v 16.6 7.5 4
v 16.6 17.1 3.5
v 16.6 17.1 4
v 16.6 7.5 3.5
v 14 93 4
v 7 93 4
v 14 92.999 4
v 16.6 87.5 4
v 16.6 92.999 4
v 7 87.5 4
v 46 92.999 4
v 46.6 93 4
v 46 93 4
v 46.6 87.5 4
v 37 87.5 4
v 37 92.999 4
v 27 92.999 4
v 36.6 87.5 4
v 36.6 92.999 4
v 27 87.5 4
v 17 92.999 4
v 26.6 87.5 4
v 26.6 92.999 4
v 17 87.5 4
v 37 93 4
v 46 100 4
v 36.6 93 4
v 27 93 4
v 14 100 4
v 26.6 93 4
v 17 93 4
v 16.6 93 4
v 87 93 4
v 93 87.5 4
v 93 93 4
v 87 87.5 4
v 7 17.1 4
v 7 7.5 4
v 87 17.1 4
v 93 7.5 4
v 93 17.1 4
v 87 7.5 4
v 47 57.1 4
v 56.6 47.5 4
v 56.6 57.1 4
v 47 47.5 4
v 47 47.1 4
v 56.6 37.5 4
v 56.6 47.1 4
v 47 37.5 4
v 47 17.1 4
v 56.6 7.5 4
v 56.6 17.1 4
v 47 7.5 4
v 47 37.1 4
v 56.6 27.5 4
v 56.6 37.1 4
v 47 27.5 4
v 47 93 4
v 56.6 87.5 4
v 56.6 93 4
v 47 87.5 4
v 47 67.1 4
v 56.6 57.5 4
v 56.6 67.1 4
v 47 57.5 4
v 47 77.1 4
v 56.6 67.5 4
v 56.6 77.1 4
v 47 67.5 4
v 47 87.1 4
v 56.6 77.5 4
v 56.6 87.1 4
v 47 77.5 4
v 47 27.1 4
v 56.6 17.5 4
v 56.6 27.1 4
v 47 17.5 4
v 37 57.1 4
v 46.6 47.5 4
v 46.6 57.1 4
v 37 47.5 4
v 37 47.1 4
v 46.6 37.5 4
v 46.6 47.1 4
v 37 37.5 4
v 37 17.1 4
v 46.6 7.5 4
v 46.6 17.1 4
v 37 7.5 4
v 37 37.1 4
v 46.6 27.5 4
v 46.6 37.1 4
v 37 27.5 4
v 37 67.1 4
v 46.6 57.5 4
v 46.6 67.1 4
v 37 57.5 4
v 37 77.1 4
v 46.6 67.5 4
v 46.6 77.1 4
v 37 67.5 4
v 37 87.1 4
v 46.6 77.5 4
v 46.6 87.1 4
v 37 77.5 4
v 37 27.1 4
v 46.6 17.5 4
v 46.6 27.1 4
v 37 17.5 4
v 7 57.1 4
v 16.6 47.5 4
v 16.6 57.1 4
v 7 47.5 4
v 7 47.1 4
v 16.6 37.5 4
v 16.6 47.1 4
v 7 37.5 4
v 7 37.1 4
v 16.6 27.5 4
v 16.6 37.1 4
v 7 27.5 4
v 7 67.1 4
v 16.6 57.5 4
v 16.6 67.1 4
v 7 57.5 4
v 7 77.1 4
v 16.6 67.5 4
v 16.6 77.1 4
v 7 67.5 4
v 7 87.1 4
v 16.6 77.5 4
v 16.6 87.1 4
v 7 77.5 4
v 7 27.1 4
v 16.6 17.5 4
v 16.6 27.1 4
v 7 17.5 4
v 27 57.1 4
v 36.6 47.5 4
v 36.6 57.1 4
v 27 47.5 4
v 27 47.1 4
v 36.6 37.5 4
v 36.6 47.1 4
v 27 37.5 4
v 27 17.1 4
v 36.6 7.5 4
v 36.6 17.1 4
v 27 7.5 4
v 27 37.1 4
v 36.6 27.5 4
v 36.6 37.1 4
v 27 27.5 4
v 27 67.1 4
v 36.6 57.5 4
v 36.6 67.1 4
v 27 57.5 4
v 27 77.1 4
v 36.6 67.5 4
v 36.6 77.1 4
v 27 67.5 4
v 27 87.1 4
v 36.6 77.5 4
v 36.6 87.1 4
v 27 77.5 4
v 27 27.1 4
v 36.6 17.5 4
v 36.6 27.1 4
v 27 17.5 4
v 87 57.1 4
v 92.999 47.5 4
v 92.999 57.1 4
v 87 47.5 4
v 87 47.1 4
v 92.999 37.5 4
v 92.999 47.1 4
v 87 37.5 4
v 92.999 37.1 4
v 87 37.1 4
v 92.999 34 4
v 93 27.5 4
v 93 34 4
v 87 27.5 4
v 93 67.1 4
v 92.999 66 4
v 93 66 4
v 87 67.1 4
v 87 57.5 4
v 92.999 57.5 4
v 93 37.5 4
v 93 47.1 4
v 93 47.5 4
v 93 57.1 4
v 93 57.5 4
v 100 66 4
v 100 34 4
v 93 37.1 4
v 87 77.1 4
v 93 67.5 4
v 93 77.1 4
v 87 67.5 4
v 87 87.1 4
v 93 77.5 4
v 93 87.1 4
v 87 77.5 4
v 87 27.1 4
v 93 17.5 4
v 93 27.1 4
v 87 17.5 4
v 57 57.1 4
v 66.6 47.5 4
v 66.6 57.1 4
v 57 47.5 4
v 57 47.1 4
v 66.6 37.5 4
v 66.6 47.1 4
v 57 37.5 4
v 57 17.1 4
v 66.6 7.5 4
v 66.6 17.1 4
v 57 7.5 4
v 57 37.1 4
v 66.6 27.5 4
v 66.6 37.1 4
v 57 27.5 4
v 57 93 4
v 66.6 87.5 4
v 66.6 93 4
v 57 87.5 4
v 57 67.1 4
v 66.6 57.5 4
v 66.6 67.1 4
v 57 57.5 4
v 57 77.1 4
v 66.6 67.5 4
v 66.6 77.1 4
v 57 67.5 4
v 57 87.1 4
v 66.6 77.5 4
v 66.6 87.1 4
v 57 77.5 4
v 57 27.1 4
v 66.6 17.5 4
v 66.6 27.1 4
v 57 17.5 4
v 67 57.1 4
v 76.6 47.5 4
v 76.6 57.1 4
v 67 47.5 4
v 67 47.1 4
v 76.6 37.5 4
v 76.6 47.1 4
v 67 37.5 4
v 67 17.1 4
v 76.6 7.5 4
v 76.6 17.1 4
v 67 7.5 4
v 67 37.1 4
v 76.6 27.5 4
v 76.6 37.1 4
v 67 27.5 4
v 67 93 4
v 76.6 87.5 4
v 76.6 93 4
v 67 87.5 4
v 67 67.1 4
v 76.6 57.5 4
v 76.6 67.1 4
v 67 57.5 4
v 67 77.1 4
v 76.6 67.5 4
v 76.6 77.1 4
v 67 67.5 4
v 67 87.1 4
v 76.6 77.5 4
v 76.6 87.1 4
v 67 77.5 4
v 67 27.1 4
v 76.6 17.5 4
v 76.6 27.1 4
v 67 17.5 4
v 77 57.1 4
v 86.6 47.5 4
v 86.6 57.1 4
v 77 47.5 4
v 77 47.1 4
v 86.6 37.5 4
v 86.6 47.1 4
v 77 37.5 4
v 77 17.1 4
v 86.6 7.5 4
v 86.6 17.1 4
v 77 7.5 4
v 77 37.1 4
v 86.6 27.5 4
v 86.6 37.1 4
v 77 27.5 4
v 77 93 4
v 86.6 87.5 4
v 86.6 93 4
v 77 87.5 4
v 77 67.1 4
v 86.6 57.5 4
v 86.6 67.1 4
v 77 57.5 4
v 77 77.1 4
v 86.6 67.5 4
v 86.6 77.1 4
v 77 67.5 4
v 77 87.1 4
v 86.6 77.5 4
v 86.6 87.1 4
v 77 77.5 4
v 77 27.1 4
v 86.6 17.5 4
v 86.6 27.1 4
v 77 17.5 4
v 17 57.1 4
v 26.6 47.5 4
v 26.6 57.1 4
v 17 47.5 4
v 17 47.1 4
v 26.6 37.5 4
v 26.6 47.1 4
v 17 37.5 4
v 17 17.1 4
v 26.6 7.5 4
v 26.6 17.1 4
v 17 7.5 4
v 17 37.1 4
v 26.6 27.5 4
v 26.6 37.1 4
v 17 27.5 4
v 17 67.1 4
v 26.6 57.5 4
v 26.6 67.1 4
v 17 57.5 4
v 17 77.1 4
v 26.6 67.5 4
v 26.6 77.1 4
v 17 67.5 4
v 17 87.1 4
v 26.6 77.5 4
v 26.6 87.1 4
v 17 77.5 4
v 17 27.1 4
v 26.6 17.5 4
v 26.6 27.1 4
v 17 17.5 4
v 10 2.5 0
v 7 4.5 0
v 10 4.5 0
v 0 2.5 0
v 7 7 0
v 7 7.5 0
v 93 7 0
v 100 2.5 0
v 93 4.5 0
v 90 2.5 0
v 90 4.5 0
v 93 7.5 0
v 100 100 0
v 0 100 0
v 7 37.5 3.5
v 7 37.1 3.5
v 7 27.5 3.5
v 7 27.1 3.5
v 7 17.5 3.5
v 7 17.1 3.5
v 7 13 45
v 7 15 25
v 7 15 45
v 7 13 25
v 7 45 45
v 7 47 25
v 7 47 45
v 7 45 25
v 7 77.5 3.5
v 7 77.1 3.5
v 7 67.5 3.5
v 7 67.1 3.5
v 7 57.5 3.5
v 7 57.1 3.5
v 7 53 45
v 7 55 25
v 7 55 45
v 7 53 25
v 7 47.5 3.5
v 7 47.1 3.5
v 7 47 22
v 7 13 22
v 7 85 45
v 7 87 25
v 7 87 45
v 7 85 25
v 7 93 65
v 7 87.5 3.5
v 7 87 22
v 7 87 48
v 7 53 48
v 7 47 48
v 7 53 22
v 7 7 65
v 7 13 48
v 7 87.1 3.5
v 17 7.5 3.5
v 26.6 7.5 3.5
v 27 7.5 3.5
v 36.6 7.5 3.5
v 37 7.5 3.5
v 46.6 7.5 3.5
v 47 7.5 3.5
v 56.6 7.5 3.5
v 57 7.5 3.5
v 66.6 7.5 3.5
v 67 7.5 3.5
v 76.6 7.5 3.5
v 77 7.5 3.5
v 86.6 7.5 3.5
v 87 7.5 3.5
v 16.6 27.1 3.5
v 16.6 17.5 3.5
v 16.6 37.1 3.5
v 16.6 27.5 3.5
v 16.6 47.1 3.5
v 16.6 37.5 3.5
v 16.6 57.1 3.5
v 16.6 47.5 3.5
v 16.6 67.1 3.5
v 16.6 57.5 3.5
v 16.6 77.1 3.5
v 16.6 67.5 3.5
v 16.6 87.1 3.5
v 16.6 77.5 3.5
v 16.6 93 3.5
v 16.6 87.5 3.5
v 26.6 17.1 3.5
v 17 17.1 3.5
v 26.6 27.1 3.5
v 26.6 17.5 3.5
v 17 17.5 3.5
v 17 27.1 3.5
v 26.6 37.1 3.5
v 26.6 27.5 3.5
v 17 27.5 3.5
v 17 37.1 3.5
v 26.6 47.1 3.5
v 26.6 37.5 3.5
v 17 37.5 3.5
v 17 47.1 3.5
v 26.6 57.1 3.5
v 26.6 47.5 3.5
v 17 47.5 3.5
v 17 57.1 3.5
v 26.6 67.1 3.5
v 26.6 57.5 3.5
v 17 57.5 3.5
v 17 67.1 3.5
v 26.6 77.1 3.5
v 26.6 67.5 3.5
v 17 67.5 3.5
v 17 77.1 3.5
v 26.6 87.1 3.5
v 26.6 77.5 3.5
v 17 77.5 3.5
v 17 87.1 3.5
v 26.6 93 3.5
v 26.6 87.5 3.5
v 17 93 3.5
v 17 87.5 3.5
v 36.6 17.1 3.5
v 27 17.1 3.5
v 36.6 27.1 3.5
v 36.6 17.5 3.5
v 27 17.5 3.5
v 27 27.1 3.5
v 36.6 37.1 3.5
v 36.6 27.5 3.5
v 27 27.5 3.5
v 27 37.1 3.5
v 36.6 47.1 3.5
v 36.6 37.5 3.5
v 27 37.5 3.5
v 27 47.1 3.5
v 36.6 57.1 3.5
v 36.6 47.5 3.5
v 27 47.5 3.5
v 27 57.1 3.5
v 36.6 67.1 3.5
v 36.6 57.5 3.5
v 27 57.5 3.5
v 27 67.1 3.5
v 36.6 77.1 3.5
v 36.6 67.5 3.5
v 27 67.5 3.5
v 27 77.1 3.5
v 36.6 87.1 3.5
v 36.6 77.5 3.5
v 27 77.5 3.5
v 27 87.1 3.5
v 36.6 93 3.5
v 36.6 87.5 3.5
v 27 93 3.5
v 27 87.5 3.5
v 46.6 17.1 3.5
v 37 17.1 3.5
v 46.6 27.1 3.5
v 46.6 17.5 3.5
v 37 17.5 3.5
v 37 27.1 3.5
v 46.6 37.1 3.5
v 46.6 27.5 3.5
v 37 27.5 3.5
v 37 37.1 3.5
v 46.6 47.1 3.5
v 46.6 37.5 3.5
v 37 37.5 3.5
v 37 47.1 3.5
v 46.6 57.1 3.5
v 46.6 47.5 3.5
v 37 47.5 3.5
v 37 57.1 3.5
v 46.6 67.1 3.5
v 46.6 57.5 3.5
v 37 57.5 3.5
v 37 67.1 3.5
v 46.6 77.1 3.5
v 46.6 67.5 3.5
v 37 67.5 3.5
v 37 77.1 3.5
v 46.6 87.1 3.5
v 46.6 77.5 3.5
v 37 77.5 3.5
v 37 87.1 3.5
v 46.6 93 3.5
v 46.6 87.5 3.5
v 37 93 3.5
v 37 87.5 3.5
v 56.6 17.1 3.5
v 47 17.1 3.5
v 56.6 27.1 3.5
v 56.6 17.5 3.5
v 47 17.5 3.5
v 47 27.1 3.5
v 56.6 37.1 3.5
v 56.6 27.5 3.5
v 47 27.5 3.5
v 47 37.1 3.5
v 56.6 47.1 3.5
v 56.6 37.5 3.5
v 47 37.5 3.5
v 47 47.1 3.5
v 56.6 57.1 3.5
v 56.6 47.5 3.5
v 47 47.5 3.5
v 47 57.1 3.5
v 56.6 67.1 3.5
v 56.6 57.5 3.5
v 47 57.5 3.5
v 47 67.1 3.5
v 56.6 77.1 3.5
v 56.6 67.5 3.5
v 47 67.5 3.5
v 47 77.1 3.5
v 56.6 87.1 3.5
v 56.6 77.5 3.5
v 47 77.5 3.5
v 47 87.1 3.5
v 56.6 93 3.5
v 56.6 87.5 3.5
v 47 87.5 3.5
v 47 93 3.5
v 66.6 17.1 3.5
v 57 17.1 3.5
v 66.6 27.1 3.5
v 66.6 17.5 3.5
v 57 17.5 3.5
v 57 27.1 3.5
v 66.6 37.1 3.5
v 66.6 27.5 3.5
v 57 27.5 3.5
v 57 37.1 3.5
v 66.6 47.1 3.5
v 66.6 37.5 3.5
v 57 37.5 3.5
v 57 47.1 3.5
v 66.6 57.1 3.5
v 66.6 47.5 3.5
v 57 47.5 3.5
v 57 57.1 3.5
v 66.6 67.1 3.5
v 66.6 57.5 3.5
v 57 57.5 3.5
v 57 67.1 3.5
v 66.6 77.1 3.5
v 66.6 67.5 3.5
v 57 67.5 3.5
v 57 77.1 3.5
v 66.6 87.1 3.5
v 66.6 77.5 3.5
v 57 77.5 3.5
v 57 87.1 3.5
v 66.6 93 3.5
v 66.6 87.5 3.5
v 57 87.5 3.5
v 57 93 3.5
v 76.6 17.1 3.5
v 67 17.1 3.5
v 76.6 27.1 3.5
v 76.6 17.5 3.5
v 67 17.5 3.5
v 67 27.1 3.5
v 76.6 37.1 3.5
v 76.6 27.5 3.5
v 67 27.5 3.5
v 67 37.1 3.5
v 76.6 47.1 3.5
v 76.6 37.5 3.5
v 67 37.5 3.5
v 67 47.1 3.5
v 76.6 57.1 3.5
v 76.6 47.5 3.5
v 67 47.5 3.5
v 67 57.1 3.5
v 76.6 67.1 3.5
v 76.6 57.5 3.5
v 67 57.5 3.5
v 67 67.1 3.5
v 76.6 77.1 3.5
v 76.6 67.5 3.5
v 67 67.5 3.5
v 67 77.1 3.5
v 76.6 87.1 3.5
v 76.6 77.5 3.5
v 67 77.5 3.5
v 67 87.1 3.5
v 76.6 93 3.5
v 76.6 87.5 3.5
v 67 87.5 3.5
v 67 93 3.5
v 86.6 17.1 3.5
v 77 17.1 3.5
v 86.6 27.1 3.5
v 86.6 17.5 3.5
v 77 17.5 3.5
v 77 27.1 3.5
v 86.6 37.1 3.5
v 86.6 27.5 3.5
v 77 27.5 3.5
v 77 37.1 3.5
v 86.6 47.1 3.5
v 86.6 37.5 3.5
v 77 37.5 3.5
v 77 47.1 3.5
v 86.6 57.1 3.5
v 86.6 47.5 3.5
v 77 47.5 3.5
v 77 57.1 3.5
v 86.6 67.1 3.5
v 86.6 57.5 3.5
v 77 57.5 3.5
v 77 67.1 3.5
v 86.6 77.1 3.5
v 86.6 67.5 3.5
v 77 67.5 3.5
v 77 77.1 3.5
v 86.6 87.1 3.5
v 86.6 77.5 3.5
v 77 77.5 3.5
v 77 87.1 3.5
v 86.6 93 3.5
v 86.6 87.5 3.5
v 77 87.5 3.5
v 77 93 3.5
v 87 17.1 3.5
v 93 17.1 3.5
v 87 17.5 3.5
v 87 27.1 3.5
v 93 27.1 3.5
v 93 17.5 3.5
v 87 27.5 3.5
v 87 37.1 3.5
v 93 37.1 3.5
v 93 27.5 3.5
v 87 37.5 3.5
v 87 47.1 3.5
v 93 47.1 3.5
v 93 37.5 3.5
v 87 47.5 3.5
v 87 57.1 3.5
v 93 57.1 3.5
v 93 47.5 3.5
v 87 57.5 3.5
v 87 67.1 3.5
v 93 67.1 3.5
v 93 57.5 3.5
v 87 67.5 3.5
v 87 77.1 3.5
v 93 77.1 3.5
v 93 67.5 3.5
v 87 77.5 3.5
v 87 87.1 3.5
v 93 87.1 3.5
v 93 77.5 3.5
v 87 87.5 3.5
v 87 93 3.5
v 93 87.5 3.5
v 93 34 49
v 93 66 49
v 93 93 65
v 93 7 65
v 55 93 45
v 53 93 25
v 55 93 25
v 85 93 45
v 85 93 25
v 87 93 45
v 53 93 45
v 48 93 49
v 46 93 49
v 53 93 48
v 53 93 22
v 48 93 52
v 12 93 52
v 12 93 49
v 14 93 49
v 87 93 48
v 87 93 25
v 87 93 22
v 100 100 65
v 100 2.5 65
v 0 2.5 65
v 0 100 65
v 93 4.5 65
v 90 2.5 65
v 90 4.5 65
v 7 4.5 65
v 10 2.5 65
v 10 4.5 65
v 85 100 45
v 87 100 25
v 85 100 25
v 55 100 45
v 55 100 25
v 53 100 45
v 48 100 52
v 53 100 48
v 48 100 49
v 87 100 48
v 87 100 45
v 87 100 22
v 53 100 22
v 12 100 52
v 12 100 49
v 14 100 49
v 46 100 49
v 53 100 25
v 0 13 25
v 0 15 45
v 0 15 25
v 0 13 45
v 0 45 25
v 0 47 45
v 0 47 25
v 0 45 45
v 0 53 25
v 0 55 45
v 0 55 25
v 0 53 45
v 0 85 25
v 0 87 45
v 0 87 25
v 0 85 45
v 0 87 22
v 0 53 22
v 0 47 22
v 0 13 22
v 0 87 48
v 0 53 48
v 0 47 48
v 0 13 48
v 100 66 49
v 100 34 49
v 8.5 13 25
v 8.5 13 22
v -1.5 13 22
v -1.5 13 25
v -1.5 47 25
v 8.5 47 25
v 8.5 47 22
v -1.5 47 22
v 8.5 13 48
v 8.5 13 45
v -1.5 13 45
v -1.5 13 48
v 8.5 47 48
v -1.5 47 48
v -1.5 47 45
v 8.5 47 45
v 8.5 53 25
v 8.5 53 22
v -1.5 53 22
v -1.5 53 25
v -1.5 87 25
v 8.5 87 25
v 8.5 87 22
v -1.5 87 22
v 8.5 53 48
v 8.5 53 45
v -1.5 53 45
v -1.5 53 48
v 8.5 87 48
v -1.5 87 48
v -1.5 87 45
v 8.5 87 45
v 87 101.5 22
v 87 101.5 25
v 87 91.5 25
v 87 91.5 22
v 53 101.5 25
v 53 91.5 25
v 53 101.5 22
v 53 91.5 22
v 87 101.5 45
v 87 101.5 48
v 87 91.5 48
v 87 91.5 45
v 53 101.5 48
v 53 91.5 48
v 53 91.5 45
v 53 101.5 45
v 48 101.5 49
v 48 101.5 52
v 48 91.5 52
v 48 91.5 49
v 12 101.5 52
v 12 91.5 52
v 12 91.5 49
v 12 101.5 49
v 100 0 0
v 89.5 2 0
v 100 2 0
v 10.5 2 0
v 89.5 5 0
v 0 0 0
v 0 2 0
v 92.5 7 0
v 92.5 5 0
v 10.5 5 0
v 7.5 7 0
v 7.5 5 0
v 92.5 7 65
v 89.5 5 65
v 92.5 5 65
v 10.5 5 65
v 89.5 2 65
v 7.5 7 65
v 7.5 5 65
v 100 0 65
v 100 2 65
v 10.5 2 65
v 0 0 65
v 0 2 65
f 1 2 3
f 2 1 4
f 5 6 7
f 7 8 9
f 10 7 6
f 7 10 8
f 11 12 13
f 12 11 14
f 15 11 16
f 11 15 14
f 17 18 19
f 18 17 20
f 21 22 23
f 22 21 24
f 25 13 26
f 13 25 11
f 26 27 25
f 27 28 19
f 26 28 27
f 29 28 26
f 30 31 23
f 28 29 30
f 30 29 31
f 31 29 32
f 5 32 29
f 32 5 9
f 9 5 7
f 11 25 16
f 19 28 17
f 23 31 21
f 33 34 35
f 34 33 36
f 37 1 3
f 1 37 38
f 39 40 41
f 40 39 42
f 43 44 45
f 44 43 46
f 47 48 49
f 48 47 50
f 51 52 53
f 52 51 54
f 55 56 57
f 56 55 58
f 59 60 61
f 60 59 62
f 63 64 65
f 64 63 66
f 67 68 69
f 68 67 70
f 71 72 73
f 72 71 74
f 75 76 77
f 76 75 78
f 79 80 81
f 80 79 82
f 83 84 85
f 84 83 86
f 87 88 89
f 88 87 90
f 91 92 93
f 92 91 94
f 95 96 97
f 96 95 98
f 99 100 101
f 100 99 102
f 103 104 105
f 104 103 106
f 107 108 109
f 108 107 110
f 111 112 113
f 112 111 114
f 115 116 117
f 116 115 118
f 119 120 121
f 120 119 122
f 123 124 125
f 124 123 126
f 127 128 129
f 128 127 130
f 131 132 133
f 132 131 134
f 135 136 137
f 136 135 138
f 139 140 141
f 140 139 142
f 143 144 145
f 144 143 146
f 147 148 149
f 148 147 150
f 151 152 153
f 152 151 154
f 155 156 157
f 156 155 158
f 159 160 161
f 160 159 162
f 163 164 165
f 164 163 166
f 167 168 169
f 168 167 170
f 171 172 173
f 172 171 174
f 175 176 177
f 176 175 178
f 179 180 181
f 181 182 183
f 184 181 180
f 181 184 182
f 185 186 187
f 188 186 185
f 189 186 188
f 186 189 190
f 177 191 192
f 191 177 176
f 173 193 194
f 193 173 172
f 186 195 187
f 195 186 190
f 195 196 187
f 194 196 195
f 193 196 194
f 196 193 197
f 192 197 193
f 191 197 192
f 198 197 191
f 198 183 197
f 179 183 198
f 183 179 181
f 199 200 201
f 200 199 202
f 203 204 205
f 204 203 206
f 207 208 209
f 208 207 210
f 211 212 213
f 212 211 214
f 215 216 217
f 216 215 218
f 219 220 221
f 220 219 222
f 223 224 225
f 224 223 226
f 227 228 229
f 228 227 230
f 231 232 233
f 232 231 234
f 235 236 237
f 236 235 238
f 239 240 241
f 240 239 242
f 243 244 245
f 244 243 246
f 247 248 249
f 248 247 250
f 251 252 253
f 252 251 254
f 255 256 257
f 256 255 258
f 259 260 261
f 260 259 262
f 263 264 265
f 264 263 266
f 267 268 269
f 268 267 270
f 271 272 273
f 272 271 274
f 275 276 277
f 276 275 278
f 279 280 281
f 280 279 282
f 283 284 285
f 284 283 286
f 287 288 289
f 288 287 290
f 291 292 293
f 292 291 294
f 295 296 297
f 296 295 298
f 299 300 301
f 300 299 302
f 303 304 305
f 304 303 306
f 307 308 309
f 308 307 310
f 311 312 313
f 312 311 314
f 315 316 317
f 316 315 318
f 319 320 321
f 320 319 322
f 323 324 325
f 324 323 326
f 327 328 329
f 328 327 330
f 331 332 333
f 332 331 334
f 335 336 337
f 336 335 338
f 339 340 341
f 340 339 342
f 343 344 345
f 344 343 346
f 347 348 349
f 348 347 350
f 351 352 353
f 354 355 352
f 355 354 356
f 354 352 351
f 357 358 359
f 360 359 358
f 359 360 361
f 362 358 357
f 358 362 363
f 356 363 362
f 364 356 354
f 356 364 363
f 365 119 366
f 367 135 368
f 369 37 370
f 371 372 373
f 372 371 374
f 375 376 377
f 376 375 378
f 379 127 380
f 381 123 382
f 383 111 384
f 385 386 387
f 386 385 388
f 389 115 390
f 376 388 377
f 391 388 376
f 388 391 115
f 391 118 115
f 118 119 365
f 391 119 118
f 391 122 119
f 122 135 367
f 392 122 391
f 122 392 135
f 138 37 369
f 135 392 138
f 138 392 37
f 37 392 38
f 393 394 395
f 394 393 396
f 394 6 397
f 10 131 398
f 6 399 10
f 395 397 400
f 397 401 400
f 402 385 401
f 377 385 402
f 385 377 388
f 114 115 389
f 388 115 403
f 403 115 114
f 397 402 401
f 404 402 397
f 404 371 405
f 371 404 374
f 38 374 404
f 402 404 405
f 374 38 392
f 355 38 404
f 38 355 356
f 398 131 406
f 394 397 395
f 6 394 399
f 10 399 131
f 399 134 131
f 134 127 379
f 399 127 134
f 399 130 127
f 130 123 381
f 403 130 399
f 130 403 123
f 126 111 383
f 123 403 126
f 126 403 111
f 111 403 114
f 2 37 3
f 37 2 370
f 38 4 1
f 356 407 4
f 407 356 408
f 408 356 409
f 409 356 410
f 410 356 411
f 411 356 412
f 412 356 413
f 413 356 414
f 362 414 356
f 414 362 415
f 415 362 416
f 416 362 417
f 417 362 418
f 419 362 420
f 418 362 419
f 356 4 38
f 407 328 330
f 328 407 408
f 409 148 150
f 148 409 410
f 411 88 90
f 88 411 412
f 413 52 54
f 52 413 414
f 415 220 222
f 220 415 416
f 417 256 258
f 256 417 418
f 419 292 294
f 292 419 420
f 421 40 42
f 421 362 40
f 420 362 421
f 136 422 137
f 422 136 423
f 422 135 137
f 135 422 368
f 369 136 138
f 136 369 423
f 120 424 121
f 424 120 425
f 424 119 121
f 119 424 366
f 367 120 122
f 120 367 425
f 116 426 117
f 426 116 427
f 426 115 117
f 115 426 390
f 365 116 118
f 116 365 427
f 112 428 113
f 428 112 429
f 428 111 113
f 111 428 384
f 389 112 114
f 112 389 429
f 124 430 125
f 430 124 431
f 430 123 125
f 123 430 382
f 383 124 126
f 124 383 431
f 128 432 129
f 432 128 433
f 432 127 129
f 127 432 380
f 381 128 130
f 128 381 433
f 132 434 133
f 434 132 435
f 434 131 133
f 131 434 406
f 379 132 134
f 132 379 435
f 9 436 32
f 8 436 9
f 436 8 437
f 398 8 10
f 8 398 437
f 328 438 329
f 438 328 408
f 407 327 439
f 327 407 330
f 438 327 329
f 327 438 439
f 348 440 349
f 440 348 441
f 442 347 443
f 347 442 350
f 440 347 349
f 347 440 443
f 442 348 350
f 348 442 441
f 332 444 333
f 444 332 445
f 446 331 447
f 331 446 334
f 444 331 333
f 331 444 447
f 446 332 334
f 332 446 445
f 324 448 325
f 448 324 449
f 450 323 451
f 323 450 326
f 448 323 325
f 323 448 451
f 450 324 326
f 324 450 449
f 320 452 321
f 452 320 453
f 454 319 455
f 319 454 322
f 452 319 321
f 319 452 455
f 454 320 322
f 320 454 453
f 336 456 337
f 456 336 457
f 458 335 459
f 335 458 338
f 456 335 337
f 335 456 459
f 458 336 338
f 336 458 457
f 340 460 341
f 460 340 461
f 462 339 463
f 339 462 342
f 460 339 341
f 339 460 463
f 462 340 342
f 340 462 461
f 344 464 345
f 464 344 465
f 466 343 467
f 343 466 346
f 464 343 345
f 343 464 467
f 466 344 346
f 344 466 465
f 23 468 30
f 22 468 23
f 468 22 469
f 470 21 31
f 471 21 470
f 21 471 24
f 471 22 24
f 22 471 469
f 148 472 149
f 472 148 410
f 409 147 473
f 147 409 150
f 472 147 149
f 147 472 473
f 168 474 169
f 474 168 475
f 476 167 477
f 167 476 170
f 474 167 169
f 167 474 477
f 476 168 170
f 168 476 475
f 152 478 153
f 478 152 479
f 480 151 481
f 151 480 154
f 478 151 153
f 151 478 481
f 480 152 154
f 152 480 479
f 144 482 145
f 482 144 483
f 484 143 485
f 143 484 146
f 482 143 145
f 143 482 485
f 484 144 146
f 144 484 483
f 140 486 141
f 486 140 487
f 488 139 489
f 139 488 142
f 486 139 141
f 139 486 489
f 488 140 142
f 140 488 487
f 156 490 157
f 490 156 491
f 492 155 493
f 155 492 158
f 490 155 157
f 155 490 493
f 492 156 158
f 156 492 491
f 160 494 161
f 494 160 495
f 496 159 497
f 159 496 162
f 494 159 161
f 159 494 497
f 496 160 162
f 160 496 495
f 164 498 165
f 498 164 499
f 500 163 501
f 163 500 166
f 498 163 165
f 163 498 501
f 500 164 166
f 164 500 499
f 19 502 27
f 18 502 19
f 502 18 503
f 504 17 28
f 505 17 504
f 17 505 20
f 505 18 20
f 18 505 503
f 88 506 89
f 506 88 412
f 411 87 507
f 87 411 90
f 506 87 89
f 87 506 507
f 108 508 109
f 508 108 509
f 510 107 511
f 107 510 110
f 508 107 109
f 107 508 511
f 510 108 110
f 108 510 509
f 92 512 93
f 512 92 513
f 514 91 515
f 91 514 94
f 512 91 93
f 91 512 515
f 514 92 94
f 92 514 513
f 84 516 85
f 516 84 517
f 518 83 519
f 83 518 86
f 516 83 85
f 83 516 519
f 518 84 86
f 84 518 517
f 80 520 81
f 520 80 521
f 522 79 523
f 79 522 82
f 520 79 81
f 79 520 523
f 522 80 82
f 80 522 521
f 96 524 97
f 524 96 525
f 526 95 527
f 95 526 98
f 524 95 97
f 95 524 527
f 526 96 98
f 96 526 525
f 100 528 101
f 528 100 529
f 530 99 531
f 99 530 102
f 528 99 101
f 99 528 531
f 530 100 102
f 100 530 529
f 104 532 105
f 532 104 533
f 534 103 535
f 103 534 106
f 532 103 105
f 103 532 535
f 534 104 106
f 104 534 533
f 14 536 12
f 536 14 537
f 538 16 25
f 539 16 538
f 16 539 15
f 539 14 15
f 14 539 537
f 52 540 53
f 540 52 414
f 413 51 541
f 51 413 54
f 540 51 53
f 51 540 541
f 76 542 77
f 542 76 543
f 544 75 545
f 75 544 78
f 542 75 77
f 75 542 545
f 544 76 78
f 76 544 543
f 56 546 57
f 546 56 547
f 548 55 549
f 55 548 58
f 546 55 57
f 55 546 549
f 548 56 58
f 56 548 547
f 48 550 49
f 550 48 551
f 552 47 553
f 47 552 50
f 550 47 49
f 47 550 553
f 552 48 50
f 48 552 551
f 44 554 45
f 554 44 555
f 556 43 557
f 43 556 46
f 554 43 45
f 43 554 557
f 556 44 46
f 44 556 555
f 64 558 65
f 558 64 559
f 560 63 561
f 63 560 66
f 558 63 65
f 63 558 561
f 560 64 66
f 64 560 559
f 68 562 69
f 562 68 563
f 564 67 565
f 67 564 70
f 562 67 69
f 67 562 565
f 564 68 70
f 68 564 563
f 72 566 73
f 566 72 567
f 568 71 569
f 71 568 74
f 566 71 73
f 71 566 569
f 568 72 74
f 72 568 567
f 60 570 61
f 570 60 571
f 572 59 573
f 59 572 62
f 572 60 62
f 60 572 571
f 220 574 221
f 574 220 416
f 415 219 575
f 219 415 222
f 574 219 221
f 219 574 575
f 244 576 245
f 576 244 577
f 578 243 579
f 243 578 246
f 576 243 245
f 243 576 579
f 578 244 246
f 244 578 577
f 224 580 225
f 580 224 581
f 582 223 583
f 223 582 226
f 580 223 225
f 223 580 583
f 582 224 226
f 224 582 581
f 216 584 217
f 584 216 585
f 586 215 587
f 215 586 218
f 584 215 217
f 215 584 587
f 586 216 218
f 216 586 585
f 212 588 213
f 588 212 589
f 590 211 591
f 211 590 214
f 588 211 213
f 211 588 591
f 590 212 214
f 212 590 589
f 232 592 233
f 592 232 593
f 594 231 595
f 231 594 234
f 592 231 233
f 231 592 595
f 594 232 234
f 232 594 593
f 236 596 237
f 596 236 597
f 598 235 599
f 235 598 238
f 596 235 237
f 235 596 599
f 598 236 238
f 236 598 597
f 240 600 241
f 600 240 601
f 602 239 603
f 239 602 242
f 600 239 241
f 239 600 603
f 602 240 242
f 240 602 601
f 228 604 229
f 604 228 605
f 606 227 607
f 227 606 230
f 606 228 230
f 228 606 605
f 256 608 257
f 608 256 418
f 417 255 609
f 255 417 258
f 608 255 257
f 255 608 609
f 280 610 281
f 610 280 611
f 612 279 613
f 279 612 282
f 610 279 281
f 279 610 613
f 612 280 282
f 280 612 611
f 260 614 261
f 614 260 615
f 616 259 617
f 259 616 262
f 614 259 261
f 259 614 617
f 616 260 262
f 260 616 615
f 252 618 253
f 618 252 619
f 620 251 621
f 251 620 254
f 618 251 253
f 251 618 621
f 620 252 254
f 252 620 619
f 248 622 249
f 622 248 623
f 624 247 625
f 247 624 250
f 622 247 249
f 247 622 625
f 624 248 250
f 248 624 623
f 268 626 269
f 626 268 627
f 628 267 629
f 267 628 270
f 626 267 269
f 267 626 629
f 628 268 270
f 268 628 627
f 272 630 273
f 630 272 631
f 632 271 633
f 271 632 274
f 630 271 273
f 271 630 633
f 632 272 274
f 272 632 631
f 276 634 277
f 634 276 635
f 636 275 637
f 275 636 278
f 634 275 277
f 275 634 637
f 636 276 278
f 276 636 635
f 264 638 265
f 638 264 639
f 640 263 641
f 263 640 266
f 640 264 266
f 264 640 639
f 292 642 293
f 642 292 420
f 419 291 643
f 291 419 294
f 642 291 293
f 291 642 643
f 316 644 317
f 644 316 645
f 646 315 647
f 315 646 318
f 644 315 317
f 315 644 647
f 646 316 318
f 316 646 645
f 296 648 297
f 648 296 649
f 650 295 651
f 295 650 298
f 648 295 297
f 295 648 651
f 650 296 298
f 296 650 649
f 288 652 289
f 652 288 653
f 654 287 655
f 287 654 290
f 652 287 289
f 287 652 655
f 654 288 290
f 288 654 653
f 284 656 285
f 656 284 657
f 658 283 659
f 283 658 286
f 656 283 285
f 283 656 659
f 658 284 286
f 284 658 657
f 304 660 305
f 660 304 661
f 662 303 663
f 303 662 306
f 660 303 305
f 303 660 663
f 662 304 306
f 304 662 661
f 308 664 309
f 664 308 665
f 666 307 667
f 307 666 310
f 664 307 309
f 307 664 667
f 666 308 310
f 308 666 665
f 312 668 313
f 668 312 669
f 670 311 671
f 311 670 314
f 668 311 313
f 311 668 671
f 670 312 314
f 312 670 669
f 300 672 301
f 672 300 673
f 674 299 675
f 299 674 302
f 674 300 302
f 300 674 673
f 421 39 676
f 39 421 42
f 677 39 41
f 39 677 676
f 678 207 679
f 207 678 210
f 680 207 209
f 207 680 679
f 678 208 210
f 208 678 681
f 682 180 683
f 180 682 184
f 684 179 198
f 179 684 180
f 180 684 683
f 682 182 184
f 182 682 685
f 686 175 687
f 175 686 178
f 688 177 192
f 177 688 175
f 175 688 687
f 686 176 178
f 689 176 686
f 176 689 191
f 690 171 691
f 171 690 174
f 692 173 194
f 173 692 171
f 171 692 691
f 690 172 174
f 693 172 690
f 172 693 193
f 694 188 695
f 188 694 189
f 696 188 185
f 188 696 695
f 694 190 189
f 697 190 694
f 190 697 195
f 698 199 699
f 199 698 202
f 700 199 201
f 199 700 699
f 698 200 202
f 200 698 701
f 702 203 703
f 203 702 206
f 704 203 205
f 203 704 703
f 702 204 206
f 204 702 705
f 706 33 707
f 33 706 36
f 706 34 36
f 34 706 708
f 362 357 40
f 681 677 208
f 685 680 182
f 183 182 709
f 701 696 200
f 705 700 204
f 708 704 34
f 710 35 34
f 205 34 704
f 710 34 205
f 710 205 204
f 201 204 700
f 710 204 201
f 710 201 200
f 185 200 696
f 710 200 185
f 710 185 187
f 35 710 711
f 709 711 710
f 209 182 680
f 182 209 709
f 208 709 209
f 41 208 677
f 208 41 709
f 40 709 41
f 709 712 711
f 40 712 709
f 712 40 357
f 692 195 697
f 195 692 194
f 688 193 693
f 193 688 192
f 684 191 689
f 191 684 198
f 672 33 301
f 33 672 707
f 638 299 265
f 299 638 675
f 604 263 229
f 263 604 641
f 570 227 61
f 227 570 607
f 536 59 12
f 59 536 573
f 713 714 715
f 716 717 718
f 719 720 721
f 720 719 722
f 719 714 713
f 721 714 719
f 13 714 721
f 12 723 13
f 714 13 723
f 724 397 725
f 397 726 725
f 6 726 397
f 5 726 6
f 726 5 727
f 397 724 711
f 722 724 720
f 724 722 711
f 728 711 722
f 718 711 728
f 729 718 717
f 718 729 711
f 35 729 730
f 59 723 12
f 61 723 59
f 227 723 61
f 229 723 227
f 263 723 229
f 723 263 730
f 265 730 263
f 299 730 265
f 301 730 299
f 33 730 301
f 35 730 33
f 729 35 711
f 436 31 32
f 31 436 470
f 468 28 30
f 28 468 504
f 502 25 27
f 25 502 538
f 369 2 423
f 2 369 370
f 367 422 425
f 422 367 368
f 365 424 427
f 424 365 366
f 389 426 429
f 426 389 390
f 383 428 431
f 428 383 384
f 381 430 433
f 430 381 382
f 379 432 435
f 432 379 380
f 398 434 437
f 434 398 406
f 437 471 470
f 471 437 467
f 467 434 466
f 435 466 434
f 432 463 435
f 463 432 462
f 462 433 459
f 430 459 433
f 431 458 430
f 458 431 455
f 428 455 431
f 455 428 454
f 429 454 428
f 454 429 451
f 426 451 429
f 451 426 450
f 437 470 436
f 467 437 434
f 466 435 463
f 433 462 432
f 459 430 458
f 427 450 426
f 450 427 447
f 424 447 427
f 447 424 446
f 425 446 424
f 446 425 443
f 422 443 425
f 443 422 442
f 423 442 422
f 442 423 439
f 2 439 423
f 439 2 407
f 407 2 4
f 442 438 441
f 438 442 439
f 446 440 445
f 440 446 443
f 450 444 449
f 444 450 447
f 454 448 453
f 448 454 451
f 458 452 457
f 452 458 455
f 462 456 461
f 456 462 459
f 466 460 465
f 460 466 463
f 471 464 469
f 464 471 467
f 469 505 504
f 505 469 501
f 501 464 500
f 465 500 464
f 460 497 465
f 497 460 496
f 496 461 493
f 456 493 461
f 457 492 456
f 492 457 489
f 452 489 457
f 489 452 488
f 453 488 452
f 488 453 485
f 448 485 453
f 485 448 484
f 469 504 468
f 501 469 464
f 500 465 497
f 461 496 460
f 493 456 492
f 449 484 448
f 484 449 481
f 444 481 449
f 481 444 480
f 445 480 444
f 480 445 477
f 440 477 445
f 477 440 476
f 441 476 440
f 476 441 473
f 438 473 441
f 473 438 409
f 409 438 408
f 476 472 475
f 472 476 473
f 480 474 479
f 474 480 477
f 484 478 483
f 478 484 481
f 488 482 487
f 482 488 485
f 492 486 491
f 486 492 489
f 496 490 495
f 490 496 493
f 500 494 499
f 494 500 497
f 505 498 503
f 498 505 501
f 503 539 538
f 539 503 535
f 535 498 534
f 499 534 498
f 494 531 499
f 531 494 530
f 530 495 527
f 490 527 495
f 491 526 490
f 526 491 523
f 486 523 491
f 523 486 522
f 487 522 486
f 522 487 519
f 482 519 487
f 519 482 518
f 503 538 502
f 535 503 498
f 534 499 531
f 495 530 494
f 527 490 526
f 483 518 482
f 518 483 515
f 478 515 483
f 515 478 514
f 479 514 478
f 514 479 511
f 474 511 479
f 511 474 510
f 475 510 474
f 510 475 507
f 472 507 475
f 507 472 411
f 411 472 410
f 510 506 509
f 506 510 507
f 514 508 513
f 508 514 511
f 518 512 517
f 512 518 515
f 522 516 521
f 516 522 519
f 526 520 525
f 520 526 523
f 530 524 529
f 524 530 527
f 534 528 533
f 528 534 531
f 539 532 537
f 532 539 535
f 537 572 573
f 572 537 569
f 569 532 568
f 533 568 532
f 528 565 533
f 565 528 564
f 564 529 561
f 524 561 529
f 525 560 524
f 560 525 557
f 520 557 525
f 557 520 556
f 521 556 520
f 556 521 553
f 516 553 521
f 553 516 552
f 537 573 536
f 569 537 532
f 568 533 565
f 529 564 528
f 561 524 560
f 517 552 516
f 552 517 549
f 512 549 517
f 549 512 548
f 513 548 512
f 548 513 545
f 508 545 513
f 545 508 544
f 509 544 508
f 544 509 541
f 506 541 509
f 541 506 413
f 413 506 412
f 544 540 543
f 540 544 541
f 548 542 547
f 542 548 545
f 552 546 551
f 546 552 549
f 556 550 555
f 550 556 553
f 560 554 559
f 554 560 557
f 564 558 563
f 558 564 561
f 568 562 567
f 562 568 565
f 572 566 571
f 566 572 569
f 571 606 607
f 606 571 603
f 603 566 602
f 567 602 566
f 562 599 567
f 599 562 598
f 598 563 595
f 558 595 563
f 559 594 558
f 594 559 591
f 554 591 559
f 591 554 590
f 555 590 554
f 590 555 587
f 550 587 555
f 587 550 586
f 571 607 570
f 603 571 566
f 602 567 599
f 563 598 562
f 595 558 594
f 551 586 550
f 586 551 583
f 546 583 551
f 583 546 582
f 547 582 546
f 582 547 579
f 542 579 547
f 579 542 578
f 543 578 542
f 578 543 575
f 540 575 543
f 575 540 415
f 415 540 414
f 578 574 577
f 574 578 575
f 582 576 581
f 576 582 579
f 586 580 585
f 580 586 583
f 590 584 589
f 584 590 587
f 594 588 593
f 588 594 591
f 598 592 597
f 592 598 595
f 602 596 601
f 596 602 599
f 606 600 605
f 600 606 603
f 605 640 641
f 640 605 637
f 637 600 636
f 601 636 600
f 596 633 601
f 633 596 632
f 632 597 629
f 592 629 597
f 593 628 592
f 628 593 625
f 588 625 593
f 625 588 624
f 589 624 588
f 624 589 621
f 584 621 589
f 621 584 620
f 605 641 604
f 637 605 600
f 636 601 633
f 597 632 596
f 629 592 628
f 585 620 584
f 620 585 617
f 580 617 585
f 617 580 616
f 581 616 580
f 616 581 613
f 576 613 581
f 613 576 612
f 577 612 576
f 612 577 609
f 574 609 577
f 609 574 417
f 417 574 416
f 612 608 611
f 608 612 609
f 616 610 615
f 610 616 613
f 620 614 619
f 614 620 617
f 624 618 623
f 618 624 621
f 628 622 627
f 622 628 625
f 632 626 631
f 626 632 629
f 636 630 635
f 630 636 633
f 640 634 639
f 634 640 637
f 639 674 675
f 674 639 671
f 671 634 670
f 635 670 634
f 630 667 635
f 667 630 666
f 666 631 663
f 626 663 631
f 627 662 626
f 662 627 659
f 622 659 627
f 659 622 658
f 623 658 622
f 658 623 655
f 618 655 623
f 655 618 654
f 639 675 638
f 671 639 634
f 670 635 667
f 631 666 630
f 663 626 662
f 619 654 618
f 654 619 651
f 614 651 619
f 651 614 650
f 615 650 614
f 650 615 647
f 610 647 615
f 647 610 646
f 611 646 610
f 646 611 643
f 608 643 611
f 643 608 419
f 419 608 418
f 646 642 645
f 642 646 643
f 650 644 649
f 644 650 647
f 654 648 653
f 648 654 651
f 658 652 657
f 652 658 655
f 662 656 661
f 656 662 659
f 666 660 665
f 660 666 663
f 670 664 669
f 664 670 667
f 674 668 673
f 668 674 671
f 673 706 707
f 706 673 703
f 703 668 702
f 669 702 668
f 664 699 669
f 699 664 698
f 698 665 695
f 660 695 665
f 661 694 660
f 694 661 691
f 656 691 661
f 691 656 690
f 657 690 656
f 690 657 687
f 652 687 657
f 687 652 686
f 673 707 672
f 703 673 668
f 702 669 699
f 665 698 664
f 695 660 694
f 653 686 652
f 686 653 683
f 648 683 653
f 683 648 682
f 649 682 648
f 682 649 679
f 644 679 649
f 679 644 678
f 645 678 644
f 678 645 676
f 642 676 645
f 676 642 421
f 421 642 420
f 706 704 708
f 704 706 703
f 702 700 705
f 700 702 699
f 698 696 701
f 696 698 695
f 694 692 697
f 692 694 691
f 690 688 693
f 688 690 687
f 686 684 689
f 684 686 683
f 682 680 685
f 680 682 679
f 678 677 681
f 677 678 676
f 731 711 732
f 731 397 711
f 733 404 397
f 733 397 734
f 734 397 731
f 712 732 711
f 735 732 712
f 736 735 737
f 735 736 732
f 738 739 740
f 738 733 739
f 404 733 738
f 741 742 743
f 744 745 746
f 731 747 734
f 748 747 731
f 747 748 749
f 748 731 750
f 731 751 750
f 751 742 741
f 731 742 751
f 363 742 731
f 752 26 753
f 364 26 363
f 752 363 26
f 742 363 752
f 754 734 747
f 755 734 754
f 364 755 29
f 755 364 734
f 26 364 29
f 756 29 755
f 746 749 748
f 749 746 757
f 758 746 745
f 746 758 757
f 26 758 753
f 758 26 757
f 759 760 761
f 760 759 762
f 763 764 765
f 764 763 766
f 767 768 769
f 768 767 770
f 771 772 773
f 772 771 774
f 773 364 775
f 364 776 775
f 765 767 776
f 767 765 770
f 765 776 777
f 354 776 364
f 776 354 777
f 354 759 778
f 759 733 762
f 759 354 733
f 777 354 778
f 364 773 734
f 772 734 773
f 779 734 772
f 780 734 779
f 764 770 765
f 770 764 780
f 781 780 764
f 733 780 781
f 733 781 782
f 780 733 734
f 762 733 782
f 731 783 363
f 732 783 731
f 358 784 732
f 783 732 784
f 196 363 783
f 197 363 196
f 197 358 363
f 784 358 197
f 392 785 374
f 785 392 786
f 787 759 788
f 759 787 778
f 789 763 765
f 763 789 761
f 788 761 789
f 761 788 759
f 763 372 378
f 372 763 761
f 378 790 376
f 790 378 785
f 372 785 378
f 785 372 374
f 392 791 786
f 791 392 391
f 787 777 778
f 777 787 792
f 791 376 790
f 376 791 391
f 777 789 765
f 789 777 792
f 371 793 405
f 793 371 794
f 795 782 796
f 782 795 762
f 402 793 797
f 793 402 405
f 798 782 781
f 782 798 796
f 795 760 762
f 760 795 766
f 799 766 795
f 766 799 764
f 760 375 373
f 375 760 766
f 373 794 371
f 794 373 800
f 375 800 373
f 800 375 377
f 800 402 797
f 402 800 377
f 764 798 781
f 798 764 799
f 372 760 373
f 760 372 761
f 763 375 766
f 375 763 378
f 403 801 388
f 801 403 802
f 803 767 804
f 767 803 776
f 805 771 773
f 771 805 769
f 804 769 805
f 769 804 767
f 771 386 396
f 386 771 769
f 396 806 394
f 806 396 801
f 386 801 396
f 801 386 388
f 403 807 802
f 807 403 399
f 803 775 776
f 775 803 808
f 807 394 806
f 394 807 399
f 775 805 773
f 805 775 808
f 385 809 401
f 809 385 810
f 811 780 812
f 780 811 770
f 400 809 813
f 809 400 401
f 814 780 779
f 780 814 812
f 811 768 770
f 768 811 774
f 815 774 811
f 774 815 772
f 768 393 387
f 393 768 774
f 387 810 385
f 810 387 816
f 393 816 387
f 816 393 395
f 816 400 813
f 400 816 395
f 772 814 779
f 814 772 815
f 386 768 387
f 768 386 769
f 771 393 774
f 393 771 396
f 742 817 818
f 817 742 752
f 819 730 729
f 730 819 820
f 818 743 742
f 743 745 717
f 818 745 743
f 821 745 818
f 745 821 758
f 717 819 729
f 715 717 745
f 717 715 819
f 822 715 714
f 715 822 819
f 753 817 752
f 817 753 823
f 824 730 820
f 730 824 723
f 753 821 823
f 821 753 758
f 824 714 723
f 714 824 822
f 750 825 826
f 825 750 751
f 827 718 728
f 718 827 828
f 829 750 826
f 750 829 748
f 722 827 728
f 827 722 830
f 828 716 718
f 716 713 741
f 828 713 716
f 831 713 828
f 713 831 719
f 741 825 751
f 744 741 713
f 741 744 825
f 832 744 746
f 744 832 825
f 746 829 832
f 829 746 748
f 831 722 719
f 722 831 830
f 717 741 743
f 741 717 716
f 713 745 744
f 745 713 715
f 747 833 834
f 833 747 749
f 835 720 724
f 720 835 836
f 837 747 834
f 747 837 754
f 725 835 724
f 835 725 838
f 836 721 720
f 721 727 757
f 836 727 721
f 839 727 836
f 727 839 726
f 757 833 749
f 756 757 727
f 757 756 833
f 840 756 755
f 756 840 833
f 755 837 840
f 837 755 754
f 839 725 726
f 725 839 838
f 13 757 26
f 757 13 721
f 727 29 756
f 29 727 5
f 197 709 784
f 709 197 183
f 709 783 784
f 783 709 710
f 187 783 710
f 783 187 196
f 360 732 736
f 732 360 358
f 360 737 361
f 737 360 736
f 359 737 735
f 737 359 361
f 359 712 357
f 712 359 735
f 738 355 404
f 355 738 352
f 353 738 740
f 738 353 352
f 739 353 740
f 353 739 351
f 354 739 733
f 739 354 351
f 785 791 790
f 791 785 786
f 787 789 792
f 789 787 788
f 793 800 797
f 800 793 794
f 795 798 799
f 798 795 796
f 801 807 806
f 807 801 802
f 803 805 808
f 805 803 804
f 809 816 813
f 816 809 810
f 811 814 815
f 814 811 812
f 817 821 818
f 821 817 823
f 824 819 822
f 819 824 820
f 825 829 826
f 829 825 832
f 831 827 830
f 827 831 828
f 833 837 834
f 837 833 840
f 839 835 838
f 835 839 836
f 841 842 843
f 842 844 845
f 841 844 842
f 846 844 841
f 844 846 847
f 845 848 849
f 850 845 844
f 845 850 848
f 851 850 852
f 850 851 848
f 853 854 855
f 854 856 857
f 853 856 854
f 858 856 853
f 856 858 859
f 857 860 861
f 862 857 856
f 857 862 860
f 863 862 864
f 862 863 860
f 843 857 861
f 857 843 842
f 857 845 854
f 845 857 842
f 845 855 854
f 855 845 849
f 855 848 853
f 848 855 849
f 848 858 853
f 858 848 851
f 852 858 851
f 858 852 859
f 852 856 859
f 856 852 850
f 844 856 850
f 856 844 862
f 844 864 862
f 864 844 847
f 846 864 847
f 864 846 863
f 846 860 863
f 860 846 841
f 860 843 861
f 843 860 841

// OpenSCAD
use <building.scad>

building(b1Dims, b1Windows, b1Doors);

/* Dims is a vector holding dimensions of the building 
 * [X, Y, height, wall thickness, floor/roof thickness].
 */
b1Dims = [100, // xdim
	     100, // ydim
	     65, // height
	     7, // wall thickness
	     4]; // floor/roof thickness

/* Windows is a 3D array holding translate : rotate pairs, one per window.
 * 
 */
b1Windows = [[[0, 30, 0], [0,0,-90]],
		    [[0, 70, 0], [0,0,-90]],
		    [[70,93,0], [0,0,0]],
		   ];

/* Doors is a 3D array holding translate : rotate : boolean tuples, one per
 * door.
 * Booleans are [ doFrame, unused, unused ].
 */
b1Doors = [[[30, 93, 0], [0,0,0], [1,0,0]],
	   	  [[93, 50, 0], [0,0,-90], [0,0,0]],
          ];

/*
 * Local variables:
 *  mode: C
 *  c-indent-level: 4
 *  c-basic-offset: 4
 * End:
 *
 * vim: ts=8 sts=4 sw=4 expandtab
 */
